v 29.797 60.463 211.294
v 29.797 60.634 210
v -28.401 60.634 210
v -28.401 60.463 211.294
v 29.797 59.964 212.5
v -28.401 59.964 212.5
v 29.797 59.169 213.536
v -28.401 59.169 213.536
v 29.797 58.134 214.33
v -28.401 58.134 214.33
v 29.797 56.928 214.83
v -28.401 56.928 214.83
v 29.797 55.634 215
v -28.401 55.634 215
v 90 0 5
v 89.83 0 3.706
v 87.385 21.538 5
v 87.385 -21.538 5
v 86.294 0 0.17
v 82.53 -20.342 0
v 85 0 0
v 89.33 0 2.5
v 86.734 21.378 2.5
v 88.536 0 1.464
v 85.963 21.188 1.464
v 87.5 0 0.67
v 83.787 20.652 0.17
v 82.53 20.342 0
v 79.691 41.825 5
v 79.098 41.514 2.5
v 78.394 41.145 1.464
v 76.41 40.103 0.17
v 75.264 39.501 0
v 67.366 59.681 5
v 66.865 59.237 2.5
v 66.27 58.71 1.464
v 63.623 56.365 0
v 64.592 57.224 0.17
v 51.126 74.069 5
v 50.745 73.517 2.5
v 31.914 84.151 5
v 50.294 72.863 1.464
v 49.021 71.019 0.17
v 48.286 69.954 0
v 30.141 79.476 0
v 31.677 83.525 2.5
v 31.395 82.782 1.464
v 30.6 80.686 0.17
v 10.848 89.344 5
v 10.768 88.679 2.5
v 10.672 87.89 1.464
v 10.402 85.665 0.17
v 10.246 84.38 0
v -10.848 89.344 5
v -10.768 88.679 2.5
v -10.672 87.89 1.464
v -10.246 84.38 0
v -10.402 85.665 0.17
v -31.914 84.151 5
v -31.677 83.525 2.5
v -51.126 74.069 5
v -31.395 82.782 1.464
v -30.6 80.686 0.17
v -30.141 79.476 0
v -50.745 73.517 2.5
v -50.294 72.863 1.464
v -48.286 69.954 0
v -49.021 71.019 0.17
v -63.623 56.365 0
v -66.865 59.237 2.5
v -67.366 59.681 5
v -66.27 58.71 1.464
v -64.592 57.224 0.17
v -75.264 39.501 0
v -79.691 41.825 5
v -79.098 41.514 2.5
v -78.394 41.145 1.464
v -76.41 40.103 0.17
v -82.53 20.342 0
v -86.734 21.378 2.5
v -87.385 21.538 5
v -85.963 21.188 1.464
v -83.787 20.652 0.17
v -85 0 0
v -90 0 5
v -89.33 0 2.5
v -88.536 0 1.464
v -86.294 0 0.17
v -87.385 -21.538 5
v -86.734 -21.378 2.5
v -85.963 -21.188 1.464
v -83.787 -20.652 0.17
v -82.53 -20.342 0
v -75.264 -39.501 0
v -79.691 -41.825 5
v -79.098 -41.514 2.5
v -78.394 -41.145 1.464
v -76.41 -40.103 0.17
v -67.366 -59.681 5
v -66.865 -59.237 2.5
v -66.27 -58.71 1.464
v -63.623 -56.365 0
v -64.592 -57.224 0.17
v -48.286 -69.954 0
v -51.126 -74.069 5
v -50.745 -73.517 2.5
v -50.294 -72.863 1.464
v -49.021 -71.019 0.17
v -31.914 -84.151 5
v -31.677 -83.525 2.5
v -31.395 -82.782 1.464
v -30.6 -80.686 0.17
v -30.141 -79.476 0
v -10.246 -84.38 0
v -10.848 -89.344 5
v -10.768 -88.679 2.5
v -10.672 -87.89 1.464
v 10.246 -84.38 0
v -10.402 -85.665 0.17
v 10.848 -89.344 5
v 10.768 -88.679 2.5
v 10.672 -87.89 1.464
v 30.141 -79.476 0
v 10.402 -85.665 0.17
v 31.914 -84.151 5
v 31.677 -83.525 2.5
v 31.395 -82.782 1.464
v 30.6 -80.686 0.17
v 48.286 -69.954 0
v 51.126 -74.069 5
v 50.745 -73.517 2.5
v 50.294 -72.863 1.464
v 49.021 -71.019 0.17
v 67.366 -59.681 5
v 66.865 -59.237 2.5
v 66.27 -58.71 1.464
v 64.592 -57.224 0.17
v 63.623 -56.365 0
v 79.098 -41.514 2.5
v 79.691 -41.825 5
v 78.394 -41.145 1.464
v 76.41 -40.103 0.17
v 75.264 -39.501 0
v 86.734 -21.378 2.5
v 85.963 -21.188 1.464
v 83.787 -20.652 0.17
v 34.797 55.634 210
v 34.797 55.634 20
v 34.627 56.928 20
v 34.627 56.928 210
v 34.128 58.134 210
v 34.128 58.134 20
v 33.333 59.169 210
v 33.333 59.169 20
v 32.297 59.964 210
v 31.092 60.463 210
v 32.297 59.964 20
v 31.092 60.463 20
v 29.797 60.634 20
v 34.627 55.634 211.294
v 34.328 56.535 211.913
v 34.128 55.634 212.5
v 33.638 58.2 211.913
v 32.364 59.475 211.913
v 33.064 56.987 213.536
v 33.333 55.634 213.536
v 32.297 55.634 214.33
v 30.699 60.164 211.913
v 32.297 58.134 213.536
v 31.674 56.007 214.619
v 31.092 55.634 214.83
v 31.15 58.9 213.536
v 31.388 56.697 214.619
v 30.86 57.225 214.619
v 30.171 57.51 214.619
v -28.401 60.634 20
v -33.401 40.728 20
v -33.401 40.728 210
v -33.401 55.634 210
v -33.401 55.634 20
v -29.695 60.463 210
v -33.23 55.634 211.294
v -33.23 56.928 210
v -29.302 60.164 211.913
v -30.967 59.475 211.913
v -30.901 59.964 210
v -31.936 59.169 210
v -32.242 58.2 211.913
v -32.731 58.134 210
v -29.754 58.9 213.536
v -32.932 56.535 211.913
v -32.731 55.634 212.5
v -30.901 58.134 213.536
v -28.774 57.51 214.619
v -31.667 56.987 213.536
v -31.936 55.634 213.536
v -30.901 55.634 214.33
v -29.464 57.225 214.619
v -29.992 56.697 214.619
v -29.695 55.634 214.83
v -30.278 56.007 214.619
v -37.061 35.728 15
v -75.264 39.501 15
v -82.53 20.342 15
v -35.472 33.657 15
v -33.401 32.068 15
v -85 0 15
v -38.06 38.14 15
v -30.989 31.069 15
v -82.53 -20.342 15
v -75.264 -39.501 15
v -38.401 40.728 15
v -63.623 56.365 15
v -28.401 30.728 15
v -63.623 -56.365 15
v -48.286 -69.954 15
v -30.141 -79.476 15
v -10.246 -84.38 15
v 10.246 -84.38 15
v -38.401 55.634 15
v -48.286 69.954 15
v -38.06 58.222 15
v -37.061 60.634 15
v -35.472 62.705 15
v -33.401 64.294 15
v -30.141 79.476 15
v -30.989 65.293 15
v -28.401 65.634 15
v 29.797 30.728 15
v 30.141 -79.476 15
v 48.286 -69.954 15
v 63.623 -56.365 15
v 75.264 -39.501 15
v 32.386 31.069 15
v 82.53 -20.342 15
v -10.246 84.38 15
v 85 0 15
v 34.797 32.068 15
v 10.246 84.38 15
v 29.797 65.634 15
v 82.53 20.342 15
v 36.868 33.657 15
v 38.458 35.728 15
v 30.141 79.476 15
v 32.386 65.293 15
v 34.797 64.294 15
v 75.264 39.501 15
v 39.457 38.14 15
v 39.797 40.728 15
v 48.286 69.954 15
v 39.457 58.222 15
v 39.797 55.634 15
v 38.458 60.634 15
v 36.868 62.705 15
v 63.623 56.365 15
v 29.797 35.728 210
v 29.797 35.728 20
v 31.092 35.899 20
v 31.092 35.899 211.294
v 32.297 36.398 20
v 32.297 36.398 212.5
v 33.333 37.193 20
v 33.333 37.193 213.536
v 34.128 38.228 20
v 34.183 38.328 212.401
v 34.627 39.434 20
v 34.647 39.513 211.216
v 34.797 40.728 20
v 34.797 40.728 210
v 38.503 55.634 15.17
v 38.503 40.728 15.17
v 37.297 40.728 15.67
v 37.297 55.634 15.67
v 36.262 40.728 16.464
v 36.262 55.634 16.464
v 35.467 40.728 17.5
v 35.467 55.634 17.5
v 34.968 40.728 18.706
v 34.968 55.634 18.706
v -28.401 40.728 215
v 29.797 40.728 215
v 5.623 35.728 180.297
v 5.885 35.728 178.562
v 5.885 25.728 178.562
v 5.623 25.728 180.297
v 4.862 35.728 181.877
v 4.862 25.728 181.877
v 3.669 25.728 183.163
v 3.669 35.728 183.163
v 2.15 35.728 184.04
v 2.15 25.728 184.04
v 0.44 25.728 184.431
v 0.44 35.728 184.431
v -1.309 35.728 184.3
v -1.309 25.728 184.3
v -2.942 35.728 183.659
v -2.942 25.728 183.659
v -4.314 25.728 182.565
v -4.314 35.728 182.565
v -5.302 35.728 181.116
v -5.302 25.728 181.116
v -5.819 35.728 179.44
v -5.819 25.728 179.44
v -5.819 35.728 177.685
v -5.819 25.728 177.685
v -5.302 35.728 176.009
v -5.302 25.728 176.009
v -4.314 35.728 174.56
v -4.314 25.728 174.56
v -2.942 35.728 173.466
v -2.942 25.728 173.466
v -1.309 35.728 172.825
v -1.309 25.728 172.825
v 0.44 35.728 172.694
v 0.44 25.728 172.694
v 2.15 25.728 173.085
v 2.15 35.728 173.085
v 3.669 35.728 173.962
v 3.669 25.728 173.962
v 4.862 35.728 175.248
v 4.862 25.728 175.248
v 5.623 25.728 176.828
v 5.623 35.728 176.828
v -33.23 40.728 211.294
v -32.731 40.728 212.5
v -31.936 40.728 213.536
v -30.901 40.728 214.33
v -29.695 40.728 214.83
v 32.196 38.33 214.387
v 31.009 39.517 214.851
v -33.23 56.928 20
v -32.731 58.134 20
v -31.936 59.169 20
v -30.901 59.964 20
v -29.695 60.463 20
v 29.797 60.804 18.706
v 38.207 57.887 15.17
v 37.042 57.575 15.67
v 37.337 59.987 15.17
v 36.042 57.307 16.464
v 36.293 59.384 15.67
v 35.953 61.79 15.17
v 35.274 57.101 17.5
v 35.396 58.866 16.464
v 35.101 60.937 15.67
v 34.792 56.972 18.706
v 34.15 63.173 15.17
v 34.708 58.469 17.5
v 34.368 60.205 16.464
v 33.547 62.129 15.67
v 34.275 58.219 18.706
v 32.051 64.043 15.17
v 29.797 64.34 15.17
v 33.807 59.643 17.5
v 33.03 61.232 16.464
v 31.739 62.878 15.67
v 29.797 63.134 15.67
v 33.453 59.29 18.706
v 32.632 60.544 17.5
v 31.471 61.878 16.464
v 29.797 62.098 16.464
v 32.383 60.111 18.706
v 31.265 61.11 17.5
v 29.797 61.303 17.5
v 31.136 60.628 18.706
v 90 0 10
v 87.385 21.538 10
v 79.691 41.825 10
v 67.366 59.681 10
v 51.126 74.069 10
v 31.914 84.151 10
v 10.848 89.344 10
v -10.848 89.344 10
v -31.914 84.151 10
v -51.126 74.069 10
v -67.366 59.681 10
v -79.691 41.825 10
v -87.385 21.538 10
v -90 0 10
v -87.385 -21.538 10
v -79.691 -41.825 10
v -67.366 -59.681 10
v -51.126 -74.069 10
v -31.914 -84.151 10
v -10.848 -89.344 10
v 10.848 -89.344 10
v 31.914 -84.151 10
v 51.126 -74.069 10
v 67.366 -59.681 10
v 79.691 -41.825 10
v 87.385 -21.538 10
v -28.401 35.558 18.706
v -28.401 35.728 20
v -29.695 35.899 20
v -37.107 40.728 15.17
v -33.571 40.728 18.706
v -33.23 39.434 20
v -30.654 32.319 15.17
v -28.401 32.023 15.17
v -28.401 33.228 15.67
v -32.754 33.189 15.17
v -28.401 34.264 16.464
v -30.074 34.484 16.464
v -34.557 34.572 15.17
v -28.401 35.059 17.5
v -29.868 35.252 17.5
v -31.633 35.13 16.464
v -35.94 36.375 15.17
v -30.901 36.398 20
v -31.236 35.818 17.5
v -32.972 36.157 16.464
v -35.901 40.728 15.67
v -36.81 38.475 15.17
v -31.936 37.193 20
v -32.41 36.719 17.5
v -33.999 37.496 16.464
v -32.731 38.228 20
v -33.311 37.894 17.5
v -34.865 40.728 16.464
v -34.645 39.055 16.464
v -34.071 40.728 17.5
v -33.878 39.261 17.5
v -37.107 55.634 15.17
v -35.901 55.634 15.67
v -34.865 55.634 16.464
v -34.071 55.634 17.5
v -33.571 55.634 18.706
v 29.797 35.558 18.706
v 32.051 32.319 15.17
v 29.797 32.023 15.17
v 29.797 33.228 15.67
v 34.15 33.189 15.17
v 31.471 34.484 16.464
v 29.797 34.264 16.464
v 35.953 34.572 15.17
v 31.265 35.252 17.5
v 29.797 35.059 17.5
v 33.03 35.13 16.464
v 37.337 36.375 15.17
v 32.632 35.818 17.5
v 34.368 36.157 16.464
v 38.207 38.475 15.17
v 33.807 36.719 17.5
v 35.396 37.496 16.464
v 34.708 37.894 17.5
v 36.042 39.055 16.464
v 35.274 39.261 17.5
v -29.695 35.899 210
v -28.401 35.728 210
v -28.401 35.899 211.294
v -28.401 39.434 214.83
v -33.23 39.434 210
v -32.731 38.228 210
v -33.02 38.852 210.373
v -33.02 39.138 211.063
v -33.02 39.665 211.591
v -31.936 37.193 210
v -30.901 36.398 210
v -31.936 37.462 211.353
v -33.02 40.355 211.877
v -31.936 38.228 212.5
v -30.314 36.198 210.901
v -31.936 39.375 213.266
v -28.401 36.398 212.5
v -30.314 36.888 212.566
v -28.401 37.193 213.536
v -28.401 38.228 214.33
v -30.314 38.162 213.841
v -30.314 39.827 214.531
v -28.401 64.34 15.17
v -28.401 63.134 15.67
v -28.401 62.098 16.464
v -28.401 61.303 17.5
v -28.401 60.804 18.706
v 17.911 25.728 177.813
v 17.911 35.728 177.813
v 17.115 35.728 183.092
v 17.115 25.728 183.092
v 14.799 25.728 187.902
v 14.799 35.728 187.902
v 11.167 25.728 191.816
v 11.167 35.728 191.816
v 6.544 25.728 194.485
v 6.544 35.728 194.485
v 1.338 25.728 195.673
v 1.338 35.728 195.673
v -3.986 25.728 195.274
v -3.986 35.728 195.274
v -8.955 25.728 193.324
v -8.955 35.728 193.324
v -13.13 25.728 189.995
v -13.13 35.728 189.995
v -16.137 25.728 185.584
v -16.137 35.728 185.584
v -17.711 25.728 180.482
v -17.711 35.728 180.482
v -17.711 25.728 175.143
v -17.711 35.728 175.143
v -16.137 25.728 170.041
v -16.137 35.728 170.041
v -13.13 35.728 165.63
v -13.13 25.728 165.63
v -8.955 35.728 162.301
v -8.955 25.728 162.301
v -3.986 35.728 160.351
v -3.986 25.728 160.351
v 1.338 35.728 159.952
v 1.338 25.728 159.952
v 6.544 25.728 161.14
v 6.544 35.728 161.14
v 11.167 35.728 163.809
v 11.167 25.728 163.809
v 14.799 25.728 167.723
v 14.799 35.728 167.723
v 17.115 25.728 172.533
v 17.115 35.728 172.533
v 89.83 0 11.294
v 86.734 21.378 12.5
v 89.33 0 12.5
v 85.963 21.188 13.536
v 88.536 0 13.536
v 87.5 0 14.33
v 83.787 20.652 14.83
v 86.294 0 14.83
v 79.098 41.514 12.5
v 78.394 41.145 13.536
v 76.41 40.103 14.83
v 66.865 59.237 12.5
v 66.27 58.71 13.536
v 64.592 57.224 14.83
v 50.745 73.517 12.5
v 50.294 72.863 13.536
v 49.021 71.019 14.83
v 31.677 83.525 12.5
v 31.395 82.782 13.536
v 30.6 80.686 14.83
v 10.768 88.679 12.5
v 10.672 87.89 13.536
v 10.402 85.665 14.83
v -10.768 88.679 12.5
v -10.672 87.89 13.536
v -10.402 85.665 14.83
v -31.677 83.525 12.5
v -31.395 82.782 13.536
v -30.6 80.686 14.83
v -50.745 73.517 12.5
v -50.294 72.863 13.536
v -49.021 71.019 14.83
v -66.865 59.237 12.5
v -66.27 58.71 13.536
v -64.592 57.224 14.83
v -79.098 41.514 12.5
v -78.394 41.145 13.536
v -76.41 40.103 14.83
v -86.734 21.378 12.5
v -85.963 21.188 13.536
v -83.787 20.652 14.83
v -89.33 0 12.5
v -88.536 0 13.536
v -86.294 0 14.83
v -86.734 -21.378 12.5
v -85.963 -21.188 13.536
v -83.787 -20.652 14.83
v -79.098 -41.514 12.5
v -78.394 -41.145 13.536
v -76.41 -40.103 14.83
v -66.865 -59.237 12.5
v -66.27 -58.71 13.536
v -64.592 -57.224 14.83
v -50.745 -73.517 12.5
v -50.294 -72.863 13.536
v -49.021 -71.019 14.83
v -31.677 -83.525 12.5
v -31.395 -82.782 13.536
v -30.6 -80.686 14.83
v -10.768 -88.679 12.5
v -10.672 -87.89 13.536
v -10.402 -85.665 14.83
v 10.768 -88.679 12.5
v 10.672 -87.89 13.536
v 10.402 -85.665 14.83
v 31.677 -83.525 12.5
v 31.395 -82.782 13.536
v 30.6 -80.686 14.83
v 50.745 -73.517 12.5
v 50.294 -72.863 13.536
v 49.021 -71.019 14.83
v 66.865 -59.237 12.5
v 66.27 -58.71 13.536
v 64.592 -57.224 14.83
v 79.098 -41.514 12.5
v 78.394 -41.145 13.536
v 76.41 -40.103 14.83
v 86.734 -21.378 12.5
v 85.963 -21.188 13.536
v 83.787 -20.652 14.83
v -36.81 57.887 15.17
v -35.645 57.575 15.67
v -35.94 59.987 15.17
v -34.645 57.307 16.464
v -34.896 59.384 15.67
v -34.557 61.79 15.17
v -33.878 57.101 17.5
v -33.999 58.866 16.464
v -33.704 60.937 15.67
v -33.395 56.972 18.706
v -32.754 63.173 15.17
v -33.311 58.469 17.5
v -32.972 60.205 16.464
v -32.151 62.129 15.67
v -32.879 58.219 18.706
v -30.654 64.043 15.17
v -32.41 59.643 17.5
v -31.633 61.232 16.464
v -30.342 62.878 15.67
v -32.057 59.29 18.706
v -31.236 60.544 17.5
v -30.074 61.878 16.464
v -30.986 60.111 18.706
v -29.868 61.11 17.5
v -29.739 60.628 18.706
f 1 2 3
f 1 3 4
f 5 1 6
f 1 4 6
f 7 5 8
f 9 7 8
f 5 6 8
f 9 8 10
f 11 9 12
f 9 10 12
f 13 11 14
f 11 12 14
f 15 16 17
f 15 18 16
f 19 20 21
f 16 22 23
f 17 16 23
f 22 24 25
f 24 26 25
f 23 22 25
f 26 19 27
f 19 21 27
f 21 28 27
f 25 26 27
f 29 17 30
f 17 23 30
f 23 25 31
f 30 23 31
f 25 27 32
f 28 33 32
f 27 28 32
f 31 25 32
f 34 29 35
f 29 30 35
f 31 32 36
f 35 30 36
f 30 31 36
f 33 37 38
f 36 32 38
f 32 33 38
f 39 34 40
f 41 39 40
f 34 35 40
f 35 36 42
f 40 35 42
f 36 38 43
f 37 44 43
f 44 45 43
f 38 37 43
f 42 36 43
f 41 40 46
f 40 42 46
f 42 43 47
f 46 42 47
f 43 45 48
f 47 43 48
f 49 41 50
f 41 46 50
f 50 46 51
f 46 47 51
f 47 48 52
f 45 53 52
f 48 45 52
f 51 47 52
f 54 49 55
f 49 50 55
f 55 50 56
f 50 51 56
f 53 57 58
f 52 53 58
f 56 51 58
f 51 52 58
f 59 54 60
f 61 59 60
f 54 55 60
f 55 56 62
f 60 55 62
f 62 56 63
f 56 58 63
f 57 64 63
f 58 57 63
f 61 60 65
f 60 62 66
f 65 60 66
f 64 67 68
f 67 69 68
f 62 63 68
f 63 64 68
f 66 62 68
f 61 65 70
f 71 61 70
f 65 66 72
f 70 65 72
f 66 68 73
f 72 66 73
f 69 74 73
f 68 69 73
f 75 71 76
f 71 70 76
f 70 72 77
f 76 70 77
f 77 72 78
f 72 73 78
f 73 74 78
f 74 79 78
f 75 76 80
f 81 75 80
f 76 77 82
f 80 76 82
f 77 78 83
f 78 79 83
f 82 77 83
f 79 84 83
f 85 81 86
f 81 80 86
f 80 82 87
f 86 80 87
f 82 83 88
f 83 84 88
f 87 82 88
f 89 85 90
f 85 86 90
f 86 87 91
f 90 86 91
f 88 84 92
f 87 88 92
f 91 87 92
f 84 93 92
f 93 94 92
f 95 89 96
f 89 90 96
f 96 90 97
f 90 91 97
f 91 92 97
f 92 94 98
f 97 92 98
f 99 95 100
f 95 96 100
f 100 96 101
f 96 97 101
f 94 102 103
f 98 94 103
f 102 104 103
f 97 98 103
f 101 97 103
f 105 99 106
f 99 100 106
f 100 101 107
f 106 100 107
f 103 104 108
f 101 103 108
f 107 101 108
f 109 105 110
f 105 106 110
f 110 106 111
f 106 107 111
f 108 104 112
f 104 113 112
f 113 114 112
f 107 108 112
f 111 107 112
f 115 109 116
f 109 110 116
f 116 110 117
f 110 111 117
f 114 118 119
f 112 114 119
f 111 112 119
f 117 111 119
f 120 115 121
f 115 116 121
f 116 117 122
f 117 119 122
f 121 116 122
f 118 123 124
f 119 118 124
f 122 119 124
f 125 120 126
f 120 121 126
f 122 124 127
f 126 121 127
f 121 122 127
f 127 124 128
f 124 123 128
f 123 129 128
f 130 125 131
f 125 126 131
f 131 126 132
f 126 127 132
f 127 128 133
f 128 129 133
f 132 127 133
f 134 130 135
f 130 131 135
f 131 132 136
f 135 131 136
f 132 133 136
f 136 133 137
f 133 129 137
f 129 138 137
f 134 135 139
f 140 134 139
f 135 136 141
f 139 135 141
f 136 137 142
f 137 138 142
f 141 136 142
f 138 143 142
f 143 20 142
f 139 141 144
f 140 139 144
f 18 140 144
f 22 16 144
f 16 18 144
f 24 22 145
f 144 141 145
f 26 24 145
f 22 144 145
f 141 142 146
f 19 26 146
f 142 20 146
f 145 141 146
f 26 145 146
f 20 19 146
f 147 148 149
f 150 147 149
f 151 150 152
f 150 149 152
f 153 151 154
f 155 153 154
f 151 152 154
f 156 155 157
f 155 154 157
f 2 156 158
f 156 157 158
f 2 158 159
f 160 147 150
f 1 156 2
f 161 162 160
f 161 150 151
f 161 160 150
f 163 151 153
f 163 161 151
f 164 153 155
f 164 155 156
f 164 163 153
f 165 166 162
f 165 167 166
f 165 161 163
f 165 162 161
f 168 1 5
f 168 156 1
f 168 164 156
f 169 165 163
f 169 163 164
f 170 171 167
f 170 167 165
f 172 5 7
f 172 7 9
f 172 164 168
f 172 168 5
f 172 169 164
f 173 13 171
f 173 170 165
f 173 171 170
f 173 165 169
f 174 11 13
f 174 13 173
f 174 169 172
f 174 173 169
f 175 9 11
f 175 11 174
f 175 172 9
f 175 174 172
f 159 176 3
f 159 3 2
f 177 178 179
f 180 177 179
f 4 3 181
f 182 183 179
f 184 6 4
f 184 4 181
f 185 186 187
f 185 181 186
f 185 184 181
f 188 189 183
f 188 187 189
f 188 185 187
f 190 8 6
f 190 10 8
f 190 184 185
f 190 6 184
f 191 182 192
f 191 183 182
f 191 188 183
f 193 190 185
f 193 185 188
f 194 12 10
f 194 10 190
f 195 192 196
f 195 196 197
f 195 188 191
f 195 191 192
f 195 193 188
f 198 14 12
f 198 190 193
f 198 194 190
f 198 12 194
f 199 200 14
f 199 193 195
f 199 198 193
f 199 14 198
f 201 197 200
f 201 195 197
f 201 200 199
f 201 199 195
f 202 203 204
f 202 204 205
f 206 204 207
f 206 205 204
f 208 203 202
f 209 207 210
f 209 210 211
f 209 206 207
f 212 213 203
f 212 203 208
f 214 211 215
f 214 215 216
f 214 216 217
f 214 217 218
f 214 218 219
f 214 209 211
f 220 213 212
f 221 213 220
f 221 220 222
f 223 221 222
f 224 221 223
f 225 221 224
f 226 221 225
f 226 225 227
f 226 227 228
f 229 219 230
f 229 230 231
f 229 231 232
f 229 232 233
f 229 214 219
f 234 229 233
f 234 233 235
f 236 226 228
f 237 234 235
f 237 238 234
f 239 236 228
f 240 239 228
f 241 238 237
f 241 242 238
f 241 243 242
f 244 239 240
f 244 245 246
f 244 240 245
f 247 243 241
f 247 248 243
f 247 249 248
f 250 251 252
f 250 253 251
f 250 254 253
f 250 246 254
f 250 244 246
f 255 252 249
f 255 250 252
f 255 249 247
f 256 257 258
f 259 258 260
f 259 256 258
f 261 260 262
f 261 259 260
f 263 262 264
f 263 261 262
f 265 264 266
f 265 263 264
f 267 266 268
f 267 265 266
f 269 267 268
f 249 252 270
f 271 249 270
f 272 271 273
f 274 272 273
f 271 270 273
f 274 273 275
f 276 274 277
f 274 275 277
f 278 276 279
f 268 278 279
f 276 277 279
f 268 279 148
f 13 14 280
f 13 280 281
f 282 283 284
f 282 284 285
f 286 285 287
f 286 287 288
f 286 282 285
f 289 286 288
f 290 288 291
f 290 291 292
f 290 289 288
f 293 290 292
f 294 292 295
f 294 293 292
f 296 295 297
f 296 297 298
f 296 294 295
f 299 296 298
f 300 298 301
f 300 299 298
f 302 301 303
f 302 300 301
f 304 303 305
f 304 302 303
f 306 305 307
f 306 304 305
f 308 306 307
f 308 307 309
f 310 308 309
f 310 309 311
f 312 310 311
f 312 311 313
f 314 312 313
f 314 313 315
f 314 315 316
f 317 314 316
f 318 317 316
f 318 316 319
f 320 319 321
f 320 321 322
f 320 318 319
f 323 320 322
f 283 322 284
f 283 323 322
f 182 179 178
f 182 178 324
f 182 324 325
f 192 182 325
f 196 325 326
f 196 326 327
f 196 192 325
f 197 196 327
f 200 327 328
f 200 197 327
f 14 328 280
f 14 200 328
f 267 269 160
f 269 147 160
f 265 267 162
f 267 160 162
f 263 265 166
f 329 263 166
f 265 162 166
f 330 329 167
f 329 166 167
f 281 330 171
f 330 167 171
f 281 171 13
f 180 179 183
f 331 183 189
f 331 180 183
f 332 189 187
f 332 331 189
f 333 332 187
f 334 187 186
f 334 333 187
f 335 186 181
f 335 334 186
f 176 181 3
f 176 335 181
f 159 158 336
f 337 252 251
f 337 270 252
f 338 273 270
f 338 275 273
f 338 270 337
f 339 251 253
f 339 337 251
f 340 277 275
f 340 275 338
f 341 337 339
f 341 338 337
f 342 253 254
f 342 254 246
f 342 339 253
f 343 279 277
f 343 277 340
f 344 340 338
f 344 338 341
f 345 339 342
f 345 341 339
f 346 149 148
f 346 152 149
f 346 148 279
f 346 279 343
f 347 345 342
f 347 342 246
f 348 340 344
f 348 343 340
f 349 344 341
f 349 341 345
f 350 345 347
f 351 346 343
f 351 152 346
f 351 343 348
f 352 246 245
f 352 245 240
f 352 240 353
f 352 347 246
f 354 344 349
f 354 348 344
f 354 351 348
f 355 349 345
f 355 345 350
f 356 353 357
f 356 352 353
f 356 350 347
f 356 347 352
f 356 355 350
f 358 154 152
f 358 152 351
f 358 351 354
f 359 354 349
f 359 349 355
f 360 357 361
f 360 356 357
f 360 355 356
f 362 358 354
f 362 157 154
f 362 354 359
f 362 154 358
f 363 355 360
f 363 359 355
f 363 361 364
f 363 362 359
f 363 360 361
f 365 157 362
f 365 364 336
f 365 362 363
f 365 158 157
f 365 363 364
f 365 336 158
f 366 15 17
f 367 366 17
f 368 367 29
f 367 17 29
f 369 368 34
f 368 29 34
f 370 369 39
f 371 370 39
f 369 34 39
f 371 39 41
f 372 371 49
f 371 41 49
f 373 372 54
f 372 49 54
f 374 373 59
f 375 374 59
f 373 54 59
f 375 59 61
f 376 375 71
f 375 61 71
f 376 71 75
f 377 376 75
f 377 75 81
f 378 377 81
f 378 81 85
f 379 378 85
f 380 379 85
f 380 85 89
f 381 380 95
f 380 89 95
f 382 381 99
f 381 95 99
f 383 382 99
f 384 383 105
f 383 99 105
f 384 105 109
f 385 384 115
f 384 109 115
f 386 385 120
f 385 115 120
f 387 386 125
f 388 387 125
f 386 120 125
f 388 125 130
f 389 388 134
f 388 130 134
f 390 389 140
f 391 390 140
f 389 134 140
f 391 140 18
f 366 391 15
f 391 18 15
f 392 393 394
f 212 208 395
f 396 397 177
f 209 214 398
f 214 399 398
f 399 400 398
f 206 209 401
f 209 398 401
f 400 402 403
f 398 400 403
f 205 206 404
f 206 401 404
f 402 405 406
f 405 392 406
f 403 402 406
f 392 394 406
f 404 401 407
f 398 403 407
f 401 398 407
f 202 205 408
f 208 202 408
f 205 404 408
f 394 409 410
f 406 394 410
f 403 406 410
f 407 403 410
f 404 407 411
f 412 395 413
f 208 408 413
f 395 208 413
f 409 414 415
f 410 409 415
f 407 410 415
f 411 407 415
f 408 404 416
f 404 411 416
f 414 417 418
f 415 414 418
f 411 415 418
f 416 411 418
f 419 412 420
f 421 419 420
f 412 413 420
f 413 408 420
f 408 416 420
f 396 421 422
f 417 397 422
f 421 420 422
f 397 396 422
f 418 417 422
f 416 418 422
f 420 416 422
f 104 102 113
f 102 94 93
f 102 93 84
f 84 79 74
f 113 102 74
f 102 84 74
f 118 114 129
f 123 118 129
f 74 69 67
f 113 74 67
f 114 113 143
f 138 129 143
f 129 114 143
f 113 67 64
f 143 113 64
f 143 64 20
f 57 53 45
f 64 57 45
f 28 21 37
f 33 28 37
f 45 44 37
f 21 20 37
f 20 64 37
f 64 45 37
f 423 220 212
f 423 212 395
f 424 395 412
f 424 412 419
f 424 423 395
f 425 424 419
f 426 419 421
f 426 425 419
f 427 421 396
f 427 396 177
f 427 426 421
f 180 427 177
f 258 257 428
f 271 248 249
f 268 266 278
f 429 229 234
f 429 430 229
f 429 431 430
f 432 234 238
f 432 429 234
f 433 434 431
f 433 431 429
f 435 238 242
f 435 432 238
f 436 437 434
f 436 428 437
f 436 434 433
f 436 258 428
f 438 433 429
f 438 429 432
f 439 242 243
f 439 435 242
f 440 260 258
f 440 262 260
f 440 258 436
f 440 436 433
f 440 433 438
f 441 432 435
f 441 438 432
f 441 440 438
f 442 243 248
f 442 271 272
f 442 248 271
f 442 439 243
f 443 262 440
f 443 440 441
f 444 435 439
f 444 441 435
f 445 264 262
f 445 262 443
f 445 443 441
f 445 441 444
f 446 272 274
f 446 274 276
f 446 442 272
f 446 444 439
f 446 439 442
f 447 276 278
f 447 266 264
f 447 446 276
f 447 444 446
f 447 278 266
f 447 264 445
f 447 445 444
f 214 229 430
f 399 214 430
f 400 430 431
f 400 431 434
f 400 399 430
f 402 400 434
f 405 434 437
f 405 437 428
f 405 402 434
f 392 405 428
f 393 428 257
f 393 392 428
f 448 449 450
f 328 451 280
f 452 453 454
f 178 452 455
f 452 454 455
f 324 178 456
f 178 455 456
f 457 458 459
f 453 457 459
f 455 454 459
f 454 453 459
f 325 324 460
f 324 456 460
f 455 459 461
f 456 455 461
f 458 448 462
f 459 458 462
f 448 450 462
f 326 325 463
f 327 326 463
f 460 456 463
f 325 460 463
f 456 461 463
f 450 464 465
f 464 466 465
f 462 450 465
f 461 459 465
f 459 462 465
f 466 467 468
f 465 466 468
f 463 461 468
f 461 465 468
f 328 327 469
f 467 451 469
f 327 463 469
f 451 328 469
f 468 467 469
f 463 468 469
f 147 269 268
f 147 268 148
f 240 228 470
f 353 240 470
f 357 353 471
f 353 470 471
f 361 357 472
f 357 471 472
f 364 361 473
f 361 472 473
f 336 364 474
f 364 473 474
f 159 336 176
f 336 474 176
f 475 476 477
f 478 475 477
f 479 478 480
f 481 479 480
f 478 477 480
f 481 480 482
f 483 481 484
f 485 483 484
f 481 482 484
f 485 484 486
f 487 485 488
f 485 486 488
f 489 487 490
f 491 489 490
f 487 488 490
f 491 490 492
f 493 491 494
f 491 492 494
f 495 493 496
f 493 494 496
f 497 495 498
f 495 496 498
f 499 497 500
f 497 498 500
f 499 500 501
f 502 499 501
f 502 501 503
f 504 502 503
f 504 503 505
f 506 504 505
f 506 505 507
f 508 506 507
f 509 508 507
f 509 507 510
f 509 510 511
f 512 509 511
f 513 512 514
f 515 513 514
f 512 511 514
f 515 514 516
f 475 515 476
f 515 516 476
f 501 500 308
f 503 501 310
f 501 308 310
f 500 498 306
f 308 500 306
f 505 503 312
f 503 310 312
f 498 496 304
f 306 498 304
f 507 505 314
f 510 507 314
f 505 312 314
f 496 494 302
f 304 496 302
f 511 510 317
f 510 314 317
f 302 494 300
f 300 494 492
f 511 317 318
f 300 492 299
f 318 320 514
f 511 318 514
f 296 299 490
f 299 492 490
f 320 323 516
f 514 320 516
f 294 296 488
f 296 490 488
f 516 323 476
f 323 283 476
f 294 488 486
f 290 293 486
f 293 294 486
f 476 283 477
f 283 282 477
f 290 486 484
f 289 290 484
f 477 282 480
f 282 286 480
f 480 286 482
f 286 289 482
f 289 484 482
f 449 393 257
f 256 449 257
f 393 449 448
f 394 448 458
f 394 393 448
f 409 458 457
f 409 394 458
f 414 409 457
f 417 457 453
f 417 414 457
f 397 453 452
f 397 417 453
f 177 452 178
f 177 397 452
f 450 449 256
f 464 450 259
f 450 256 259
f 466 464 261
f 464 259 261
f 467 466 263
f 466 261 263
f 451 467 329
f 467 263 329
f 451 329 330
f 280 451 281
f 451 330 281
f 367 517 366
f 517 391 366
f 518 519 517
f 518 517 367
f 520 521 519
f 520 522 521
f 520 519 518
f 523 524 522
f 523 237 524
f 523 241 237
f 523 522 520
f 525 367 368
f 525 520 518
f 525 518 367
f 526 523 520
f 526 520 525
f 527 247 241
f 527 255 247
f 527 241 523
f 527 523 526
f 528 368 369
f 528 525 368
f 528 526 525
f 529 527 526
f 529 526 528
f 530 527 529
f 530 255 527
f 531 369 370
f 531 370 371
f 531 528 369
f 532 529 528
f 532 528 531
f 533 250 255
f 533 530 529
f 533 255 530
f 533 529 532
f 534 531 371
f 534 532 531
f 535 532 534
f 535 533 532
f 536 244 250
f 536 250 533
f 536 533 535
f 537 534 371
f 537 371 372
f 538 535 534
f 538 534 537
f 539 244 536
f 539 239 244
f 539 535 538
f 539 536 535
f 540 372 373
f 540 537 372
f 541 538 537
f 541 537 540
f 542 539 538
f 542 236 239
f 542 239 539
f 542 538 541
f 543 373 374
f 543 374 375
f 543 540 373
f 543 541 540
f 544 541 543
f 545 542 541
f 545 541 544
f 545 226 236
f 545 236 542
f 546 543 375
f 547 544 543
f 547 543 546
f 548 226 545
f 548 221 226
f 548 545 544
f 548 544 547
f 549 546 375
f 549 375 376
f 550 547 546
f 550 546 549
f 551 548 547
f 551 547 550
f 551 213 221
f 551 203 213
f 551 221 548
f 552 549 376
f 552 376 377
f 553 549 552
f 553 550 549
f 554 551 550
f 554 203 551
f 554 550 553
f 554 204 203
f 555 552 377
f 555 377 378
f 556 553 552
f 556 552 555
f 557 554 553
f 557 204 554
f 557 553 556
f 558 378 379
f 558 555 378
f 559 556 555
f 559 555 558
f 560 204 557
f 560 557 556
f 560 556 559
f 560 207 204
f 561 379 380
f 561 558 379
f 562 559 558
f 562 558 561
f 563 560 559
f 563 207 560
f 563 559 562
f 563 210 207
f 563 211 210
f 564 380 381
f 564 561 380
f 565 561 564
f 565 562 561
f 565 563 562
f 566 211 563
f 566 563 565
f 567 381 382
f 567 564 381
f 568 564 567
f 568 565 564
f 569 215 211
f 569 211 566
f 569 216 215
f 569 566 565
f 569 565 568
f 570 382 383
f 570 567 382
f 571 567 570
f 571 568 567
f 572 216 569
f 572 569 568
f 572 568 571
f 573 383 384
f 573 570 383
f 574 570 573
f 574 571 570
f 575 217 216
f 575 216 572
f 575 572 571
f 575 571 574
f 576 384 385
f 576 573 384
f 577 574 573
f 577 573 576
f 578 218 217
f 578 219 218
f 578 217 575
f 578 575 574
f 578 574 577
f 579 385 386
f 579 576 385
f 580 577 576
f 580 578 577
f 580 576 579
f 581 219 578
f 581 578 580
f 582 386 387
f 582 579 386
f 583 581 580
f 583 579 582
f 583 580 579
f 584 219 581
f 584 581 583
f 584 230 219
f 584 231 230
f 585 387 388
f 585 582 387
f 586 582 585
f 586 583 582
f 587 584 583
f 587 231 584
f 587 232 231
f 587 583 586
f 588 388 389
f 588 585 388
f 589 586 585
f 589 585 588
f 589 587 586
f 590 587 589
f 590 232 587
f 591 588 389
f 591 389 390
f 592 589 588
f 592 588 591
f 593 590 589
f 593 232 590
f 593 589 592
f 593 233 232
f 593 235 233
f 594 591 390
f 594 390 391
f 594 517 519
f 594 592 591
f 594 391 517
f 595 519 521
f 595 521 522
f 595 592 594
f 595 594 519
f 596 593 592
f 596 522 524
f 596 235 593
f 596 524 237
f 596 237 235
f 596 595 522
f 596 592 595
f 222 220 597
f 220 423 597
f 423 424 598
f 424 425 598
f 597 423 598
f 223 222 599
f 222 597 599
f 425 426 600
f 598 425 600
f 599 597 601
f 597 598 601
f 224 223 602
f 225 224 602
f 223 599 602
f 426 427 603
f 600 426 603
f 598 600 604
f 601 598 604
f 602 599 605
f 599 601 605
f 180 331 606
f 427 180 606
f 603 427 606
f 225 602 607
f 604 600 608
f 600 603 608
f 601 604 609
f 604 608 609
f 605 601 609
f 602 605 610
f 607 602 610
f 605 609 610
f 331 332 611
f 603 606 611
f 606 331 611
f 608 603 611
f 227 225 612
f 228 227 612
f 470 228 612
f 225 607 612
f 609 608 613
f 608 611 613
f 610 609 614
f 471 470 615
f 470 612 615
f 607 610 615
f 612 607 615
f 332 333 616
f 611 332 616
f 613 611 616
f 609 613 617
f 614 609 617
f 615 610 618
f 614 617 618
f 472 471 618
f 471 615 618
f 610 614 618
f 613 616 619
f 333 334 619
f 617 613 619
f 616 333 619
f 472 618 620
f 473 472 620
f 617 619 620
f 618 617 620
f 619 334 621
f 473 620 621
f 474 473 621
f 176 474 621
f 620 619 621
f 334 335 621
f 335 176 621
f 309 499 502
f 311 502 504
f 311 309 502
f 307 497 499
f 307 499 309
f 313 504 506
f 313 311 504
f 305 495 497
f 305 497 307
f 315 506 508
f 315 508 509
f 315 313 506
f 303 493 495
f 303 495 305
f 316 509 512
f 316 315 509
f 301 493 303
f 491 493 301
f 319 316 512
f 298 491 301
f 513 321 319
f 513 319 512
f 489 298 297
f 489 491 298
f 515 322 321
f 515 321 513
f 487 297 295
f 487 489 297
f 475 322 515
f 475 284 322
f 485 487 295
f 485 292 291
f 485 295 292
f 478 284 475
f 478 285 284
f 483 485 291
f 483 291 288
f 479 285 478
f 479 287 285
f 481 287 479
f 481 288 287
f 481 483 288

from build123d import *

# Parameters (mm, degrees)
F0_R          = 90
F1_DEPTH      = 15
F3_W          = 68.1982785463
F3_H          = 24.9051749706
F4_DEPTH      = 200
F6_R          = 17.9109144278
F6_R_2        = 5.8846273737
F7_DEPTH      = 10
F8_R          = 5
F9_R          = 5
F10_R         = 5
F11_T1_DEPTH  = 195
F11_T3_DEPTH  = 14.9051749706
F11_T5_DEPTH  = 27.4051749706
F11_T7_DEPTH  = 58.1982785463
F11_S11_W     = 5.1
F11_S11_H     = 5.1
F11_T12_DEPTH = 5.1
F11_S17_W     = 5.1
F11_S17_H     = 5.1
F11_T18_DEPTH = 5.1
F11_T22_ANGLE = 90
F11_T23_DEPTH = 14.9051749706
F11_T25_DEPTH = 58.1982785463
F11_T28_ANGLE = 90
F11_T30_ANGLE = 90
F11_T32_ANGLE = 90
F11_T34_ANGLE = 90


# Not quite as in the source:
# - a fillet or chamfer that OpenCascade refuses, or shapes differently, is made with other operations: its cross-section is extruded or revolved along the edge and cut away or added


with BuildPart() as f1:
    # F0 (on Top) → F1 (new body)
    with BuildSketch(Plane.XY):
        Circle(F0_R)
    extrude(amount=F1_DEPTH)

    # F3 (on face) → F4 (join)
    with BuildSketch(Plane.XY.offset(15)):
        with Locations((0.6982758641, 48.1810383499)):
            Rectangle(F3_W, F3_H)
    extrude(amount=F4_DEPTH)

    # F8
    f8_edges = [f1.edges().sort_by_distance(p)[0] for p in [
        (-90, 0, 15),
    ]]
    fillet(f8_edges, radius=F8_R)

    # F9
    f9_edges = [f1.edges().sort_by_distance(p)[0] for p in [
        (-90, 0, 0),
    ]]
    fillet(f9_edges, radius=F9_R)

    # F10
    f10_edges = [f1.edges().sort_by_distance(p)[0] for p in [
        (0.698276, 35.728451, 215),
        (34.797415, 35.728451, 115),
    ]]
    fillet(f10_edges, radius=F10_R)

    # F11: fillet of radius 5 on 14 edges, made by hand

    # F11_s2 → F11_t1 (cut)
    with BuildSketch(Plane.XY.offset(15)):
        with BuildLine():
            ThreePointArc((-28.400863409, 35.7284508646), (-31.936397315, 37.1929169586), (-33.400863409, 40.7284508646))
            Line((-33.400863409, 40.7284508646), (-33.400863409, 35.7284508646))
            Line((-33.400863409, 35.7284508646), (-28.400863409, 35.7284508646))
        make_face()
        with BuildLine():
            ThreePointArc((-33.400863409, 55.6336258352), (-31.936397315, 59.1691597411), (-28.400863409, 60.6336258352))
            Line((-28.400863409, 60.6336258352), (-33.400863409, 60.6336258352))
            Line((-33.400863409, 60.6336258352), (-33.400863409, 55.6336258352))
        make_face()
        with BuildLine():
            ThreePointArc((34.7974151373, 55.6336258352), (33.3329490432, 59.1691597411), (29.7974151373, 60.6336258352))
            Line((29.7974151373, 60.6336258352), (34.7974151373, 60.6336258352))
            Line((34.7974151373, 60.6336258352), (34.7974151373, 55.6336258352))
        make_face()
    extrude(amount=F11_T1_DEPTH, mode=Mode.SUBTRACT)

    # F11_s4 → F11_t3 (cut)
    with BuildSketch(Plane.XZ.offset(-55.6336258352)):
        with BuildLine():
            ThreePointArc((-33.400863409, 210), (-31.936397315, 213.5355339059), (-28.400863409, 215))
            Line((-28.400863409, 215), (-33.400863409, 215))
            Line((-33.400863409, 215), (-33.400863409, 210))
        make_face()
    extrude(amount=F11_T3_DEPTH, mode=Mode.SUBTRACT)

    # F11_s6 → F11_t5 (cut)
    with BuildSketch(Plane.XZ.offset(-55.6336258352)):
        with BuildLine():
            ThreePointArc((34.7974151373, 210), (33.3329490432, 213.5355339059), (29.7974151373, 215))
            Line((29.7974151373, 215), (34.7974151373, 215))
            Line((34.7974151373, 215), (34.7974151373, 210))
        make_face()
    extrude(amount=F11_T5_DEPTH, mode=Mode.SUBTRACT)

    # F11_s8 → F11_t7 (cut)
    with BuildSketch(Plane.YZ.offset(-28.400863409)):
        with BuildLine():
            ThreePointArc((60.6336258352, 210), (59.1691597411, 213.5355339059), (55.6336258352, 215))
            Line((55.6336258352, 215), (60.6336258352, 215))
            Line((60.6336258352, 215), (60.6336258352, 210))
        make_face()
    extrude(amount=F11_T7_DEPTH, mode=Mode.SUBTRACT)


with BuildPart() as f7:
    # F6 (on face) → F7 (new body)
    with BuildSketch(Plane.XZ.offset(-35.7284508646)):
        with Locations((0, 177.8125017881)):
            Circle(F6_R)
        with Locations((0, 178.5624921322)):
            Circle(F6_R_2, mode=Mode.SUBTRACT)
    extrude(amount=F7_DEPTH)


with BuildPart() as f11_tool10:
    # F11_s11 → F11_t12 (new body)
    with BuildSketch(Plane.XY.offset(210)):
        with Locations((-30.950863409, 58.1836258352)):
            Rectangle(F11_S11_W, F11_S11_H)
    extrude(amount=F11_T12_DEPTH)

    # F11_s13 → F11_t14 (revolve, cut)
    with BuildSketch(Plane(origin=(-28.400863409, 55.6336258352, 210), x_dir=(0.7071067812, -0.7071067812, 0), z_dir=(-0.7071067812, -0.7071067812, 0))):
        with BuildLine():
            ThreePointArc((0, -5), (5, 0), (0, 5))
            Line((0, 5), (0, -5))
        make_face()
    revolve(axis=Axis((-28.400863409, 55.6336258352, 210), (0, 0, 1)), mode=Mode.SUBTRACT)


with BuildPart() as f1_1:
    add(f1.part)

    # F11_t9: cut F11_tool10
    add(f11_tool10.part, mode=Mode.SUBTRACT)


with BuildPart() as f11_tool16:
    # F11_s17 → F11_t18 (new body)
    with BuildSketch(Plane.XY.offset(210)):
        with Locations((32.3474151373, 58.1836258352)):
            Rectangle(F11_S17_W, F11_S17_H)
    extrude(amount=F11_T18_DEPTH)

    # F11_s19 → F11_t20 (revolve, cut)
    with BuildSketch(Plane(origin=(29.7974151373, 55.6336258352, 210), x_dir=(-0.7071067812, -0.7071067812, 0), z_dir=(-0.7071067812, 0.7071067812, 0))):
        with BuildLine():
            ThreePointArc((0, -5), (5, 0), (0, 5))
            Line((0, 5), (0, -5))
        make_face()
    revolve(axis=Axis((29.7974151373, 55.6336258352, 210), (0, 0, 1)), mode=Mode.SUBTRACT)


with BuildPart() as f1_2:
    add(f1_1.part)

    # F11_t15: cut F11_tool16
    add(f11_tool16.part, mode=Mode.SUBTRACT)

    # F11_s21 → F11_t22 (revolve, cut)
    with BuildSketch(Plane.XY.offset(210)):
        with BuildLine():
            ThreePointArc((-33.400863409, 40.7284508646), (-31.936397315, 37.1929169586), (-28.400863409, 35.7284508646))
            Line((-28.400863409, 35.7284508646), (-33.400863409, 35.7284508646))
            Line((-33.400863409, 35.7284508646), (-33.400863409, 40.7284508646))
        make_face()
    revolve(axis=Axis((-33.400863409, 40.7284508646, 210), (-1, 0, 0)), revolution_arc=F11_T22_ANGLE, mode=Mode.SUBTRACT)

    # F11_s24 → F11_t23 (join)
    with BuildSketch(Plane.XZ.offset(-55.6336258352)):
        with BuildLine():
            ThreePointArc((-38.400863409, 15), (-34.8653295031, 16.4644660941), (-33.400863409, 20))
            Line((-33.400863409, 20), (-33.400863409, 15))
            Line((-33.400863409, 15), (-38.400863409, 15))
        make_face()
        with BuildLine():
            ThreePointArc((39.7974151373, 15), (36.2618812314, 16.4644660941), (34.7974151373, 20))
            Line((34.7974151373, 20), (34.7974151373, 15))
            Line((34.7974151373, 15), (39.7974151373, 15))
        make_face()
    extrude(amount=F11_T23_DEPTH)

    # F11_s26 → F11_t25 (join)
    with BuildSketch(Plane.YZ.offset(-28.400863409)):
        with BuildLine():
            ThreePointArc((65.6336258352, 15), (62.0980919292, 16.4644660941), (60.6336258352, 20))
            Line((60.6336258352, 20), (60.6336258352, 15))
            Line((60.6336258352, 15), (65.6336258352, 15))
        make_face()
        with BuildLine():
            ThreePointArc((30.7284508646, 15), (34.2639847705, 16.4644660941), (35.7284508646, 20))
            Line((35.7284508646, 20), (35.7284508646, 15))
            Line((35.7284508646, 15), (30.7284508646, 15))
        make_face()
    extrude(amount=F11_T25_DEPTH)

    # F11_s27 → F11_t28 (revolve)
    with BuildSketch(Plane.YZ.offset(29.7974151373)):
        with BuildLine():
            ThreePointArc((30.7284508646, 15), (34.2639847705, 16.4644660941), (35.7284508646, 20))
            Line((35.7284508646, 20), (35.7284508646, 15))
            Line((35.7284508646, 15), (30.7284508646, 15))
        make_face()
    revolve(axis=Axis((29.7974151373, 40.7284508646, 15), (0, 0, 1)), revolution_arc=F11_T28_ANGLE)

    # F11_s29 → F11_t30 (revolve)
    with BuildSketch(Plane.YZ.offset(-28.400863409)):
        with BuildLine():
            ThreePointArc((30.7284508646, 15), (34.2639847705, 16.4644660941), (35.7284508646, 20))
            Line((35.7284508646, 20), (35.7284508646, 15))
            Line((35.7284508646, 15), (30.7284508646, 15))
        make_face()
    revolve(axis=Axis((-28.400863409, 40.7284508646, 15), (0, 0, -1)), revolution_arc=F11_T30_ANGLE)

    # F11_s31 → F11_t32 (revolve)
    with BuildSketch(Plane.XZ.offset(-55.6336258352)):
        with BuildLine():
            ThreePointArc((39.7974151373, 15), (36.2618812314, 16.4644660941), (34.7974151373, 20))
            Line((34.7974151373, 20), (34.7974151373, 15))
            Line((34.7974151373, 15), (39.7974151373, 15))
        make_face()
    revolve(axis=Axis((29.7974151373, 55.6336258352, 15), (0, 0, 1)), revolution_arc=F11_T32_ANGLE)

    # F11_s33 → F11_t34 (revolve)
    with BuildSketch(Plane.XZ.offset(-55.6336258352)):
        with BuildLine():
            ThreePointArc((-38.400863409, 15), (-34.8653295031, 16.4644660941), (-33.400863409, 20))
            Line((-33.400863409, 20), (-33.400863409, 15))
            Line((-33.400863409, 15), (-38.400863409, 15))
        make_face()
    revolve(axis=Axis((-28.400863409, 55.6336258352, 15), (0, 0, -1)), revolution_arc=F11_T34_ANGLE)


solid = Compound([f7.part, f1_2.part])
